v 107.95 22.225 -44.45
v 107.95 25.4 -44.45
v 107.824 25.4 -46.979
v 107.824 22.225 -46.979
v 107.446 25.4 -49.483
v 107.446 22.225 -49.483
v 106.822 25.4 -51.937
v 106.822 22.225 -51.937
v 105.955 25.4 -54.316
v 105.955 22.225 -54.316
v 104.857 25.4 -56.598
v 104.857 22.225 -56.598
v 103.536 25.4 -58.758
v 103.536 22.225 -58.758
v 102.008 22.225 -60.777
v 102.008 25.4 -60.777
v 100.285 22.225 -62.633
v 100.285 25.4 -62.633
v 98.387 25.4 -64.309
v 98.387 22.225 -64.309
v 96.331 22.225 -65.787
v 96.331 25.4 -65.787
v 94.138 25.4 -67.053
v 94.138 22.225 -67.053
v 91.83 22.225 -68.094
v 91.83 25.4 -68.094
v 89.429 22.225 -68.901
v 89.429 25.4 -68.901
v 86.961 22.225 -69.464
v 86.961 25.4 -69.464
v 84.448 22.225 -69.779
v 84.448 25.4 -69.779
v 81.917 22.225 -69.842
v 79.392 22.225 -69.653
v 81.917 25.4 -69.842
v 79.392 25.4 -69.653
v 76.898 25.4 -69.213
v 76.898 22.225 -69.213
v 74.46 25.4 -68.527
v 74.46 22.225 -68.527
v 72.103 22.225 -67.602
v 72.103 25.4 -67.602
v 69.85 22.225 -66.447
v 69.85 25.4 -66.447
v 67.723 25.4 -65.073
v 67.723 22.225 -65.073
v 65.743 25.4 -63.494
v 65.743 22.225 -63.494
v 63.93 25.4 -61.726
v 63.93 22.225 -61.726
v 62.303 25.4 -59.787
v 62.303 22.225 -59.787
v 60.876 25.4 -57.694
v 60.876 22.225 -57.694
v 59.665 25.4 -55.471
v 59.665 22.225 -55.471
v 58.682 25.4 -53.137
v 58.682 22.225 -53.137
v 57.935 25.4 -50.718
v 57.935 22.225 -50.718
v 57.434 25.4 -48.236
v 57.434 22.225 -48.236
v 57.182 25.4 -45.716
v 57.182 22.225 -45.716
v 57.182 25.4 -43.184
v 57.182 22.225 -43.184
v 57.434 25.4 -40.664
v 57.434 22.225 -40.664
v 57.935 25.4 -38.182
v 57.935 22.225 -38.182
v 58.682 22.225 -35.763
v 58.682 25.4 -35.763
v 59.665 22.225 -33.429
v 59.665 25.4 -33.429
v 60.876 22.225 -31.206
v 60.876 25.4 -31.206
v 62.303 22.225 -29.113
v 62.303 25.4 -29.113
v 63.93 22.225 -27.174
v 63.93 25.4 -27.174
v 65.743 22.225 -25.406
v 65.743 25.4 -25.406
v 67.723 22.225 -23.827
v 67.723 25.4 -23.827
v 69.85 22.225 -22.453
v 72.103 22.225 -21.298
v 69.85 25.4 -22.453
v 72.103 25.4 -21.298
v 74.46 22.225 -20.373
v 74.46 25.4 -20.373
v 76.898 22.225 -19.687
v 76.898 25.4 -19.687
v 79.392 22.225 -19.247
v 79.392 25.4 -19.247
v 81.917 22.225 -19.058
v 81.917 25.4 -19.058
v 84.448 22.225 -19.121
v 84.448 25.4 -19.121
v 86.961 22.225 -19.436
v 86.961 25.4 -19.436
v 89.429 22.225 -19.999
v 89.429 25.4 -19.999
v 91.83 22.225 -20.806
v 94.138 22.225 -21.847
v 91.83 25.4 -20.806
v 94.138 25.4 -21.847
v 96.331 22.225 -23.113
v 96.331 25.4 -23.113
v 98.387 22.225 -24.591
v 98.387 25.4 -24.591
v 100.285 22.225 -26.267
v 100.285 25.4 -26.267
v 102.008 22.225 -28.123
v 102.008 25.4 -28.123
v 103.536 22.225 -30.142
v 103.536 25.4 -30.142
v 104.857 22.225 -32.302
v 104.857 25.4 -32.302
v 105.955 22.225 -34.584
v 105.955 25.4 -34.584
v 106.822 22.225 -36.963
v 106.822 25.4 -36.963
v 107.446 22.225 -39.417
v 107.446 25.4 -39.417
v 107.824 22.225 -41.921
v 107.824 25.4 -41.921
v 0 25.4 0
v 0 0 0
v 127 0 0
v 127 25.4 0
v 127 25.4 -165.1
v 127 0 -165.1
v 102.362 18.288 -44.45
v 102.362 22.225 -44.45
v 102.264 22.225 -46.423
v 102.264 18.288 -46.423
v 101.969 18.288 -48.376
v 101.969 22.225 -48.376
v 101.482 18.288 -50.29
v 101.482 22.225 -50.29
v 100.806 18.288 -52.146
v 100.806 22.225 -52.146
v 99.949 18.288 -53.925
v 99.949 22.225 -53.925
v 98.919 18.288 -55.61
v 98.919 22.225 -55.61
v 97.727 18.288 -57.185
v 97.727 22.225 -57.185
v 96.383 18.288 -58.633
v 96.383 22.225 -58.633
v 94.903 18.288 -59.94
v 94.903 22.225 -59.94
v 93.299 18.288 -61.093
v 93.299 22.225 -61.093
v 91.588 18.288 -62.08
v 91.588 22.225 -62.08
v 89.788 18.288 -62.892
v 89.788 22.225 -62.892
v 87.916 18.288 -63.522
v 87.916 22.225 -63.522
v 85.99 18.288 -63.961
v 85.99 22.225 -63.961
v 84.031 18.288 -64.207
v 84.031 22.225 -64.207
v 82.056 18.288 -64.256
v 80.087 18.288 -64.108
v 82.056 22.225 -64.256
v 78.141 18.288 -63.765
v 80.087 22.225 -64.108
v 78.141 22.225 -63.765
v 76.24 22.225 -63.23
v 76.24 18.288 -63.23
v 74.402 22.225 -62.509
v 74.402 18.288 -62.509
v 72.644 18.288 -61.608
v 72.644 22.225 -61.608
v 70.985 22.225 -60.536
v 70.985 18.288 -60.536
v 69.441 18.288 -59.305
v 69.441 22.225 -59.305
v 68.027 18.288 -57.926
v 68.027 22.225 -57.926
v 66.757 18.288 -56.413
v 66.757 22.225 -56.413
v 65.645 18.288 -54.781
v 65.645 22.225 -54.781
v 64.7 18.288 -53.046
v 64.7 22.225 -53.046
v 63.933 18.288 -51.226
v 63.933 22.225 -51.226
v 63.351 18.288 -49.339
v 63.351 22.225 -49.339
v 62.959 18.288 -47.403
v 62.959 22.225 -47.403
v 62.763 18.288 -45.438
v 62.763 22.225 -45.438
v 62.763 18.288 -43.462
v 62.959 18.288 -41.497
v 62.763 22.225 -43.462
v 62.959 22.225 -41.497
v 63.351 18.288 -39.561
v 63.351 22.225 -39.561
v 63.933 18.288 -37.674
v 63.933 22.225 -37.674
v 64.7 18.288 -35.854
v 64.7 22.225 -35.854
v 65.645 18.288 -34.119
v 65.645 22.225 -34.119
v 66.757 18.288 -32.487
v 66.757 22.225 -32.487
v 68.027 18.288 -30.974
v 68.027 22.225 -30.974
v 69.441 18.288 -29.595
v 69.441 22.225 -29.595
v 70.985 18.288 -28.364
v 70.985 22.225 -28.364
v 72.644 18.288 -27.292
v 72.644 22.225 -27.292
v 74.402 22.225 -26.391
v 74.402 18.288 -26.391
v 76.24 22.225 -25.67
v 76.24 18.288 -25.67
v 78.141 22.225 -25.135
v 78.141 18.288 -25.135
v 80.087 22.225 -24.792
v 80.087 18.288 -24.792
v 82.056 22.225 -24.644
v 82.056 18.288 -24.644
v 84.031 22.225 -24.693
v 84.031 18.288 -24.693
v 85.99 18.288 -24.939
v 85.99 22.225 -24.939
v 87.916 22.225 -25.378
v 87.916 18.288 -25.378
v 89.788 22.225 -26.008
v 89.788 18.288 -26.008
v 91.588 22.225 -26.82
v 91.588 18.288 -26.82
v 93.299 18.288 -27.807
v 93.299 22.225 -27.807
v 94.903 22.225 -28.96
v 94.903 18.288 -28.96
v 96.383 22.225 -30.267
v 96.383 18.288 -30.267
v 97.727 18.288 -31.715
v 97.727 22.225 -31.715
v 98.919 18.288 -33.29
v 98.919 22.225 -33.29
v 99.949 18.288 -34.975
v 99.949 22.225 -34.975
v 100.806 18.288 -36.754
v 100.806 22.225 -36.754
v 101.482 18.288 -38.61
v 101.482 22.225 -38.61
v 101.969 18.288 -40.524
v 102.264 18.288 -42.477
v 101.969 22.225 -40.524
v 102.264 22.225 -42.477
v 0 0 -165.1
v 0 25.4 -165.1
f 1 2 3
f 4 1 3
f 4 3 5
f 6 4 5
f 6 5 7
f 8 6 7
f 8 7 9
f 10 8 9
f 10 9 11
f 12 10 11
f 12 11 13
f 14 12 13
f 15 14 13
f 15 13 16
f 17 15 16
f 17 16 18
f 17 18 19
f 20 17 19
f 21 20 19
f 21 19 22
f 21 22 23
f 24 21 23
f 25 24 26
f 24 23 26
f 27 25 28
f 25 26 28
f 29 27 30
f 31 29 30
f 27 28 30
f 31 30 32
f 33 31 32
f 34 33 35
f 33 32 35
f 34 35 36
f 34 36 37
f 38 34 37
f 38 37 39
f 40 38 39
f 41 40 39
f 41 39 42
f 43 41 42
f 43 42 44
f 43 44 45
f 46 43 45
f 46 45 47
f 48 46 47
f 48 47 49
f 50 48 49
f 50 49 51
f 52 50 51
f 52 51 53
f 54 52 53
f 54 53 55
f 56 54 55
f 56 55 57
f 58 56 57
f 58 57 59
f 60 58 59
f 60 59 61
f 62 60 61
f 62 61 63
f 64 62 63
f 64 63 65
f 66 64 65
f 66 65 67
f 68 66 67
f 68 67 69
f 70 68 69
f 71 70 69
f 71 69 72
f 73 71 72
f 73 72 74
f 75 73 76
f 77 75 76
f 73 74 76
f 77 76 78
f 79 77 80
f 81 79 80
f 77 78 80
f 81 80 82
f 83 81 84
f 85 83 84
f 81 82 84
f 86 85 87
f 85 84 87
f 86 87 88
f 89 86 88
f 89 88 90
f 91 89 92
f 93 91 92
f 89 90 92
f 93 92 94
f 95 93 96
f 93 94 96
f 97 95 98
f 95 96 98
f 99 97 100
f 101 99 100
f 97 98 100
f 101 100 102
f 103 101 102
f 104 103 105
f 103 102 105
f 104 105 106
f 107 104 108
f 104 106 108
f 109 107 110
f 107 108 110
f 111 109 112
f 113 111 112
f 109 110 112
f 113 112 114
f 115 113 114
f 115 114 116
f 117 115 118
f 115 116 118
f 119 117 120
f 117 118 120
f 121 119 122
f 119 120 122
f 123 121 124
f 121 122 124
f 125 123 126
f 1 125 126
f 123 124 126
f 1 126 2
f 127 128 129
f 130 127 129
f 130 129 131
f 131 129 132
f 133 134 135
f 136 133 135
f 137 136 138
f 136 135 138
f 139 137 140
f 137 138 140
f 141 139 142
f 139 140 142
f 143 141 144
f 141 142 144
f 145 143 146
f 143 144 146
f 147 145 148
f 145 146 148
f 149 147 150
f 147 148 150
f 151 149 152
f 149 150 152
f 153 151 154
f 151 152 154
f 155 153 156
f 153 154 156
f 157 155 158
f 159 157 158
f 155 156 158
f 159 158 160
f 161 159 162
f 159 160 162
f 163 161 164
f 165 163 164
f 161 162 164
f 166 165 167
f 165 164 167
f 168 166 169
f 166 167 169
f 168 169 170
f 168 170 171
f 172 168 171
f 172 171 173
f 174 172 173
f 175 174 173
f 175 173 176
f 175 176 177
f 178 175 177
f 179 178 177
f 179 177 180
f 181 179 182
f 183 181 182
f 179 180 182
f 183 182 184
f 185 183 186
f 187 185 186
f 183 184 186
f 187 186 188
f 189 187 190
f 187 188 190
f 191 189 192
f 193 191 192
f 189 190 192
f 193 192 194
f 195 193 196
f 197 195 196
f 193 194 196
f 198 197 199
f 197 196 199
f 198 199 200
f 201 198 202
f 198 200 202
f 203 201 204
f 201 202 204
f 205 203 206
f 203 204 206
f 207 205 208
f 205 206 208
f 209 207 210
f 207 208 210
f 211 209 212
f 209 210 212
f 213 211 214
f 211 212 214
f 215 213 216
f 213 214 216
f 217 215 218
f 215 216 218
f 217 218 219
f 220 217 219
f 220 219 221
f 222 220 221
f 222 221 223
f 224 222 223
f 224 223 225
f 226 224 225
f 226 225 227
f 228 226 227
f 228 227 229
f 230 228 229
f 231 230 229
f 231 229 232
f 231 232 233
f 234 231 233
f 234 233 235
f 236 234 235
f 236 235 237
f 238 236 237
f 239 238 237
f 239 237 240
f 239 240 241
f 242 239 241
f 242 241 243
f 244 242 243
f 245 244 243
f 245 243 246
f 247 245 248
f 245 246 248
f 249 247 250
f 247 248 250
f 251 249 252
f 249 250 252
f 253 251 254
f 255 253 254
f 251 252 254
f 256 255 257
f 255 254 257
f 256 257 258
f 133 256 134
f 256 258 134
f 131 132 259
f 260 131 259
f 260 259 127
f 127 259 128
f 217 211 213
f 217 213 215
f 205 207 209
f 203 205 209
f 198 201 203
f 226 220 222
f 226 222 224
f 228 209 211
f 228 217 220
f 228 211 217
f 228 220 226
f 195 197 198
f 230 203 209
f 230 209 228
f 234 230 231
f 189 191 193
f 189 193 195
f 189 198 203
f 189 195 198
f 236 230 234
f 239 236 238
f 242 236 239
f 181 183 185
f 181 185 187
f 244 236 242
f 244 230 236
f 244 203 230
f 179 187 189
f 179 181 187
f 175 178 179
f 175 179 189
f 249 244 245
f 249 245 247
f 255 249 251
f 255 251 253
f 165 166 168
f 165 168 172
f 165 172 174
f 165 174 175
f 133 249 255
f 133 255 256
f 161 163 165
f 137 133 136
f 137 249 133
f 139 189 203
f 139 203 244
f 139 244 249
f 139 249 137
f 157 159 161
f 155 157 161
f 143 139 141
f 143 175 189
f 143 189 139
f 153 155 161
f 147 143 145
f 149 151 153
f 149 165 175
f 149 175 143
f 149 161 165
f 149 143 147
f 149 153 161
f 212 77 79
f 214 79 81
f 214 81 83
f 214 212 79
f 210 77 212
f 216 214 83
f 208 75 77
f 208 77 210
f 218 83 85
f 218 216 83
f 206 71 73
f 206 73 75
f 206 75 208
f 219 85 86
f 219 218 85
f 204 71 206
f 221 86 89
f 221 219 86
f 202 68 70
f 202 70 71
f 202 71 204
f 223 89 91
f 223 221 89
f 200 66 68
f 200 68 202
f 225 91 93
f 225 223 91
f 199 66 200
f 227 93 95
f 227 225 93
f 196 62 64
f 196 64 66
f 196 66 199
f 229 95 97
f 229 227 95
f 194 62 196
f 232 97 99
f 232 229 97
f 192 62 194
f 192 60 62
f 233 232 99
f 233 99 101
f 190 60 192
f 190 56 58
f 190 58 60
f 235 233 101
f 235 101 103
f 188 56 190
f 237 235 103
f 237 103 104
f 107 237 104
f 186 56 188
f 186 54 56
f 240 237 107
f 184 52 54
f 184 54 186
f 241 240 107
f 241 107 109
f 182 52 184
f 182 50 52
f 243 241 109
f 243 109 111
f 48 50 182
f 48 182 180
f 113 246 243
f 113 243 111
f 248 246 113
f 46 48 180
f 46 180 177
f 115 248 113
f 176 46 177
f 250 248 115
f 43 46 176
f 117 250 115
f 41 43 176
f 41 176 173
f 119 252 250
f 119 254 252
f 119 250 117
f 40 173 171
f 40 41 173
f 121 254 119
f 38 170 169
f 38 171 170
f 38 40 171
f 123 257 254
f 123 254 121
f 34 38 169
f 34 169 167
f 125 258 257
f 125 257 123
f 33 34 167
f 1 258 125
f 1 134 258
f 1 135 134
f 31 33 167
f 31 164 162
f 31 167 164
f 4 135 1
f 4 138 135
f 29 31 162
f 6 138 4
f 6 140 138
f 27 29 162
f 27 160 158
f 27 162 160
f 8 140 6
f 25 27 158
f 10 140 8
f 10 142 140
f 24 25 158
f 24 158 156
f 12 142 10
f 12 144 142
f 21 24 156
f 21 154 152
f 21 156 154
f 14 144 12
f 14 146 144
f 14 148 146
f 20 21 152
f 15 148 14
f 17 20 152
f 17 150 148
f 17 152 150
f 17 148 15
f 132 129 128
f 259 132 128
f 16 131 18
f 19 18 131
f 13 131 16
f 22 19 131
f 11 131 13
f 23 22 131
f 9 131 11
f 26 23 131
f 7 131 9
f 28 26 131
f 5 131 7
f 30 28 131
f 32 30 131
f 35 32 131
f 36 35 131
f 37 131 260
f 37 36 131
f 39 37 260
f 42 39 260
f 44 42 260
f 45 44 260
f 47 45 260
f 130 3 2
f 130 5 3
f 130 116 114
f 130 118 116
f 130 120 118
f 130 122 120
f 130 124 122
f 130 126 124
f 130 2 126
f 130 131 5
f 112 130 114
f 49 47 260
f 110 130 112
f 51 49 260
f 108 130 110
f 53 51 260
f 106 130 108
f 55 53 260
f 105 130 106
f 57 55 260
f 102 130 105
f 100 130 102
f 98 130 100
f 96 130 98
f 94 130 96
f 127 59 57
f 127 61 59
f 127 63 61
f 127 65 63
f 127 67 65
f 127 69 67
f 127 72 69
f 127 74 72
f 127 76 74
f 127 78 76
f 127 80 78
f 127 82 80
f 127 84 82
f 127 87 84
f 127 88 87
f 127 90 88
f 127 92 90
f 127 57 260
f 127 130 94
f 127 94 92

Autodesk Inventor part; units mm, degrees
ref_plane "YZ Plane" through (0, 0, 0) normal (1, 0, 0) x (0, 1, 0)
ref_plane "XZ Plane" through (0, 0, 0) normal (0, 1, 0) x (-1, 0, 0)
ref_plane "XY Plane" through (0, 0, 0) normal (0, 0, 1) x (1, 0, 0)
sketch "Sketch1" plane through (0, 0, 0) normal (0, 1, 0) x (-1, 0, 0)
  line L0 (0, 0) -> (-127, 0)
  line L1 (-127, 0) -> (-127, -165.1)
  line L2 (-127, -165.1) -> (0, -165.1)
  line L3 (0, -165.1) -> (0, 0)
  dimension "d0" = 127
  dimension "d1" = 165.1
extrude "Extrusion1" add sketch "Sketch1" along normal blind 25.4
sketch "Sketch2" plane through (0, 25.4, 0) normal (0, 1, 0) x (1, 0, 0)
  circle A0 centre (82.55, 44.45) radius 25.4
  line L0 (0, 0) -> (127, 0) projected
  line L1 (127, 0) -> (127, 165.1) projected
  line L2 (127, 165.1) -> (0, 165.1) projected
  line L3 (0, 165.1) -> (0, 0) projected
  dimension "d4" = 50.8
  dimension "d5" = 44.45
  dimension "d6" = 44.45
extrude "Extrusion2" cut sketch "Sketch2" against normal blind 3.175 contours A0
sketch "Sketch3" plane through (82.55, 22.225, -44.45) normal (0, 1, 0) x (1, 0, 0)
  circle A0 centre (0, 0) radius 19.812
  point P0 (-82.55, -44.45)
  dimension "d9" = 39.624
extrude "Extrusion3" cut sketch "Sketch3" against normal blind 3.937
equation "\"d5\" = d6"
properties part number "AK plaque"
